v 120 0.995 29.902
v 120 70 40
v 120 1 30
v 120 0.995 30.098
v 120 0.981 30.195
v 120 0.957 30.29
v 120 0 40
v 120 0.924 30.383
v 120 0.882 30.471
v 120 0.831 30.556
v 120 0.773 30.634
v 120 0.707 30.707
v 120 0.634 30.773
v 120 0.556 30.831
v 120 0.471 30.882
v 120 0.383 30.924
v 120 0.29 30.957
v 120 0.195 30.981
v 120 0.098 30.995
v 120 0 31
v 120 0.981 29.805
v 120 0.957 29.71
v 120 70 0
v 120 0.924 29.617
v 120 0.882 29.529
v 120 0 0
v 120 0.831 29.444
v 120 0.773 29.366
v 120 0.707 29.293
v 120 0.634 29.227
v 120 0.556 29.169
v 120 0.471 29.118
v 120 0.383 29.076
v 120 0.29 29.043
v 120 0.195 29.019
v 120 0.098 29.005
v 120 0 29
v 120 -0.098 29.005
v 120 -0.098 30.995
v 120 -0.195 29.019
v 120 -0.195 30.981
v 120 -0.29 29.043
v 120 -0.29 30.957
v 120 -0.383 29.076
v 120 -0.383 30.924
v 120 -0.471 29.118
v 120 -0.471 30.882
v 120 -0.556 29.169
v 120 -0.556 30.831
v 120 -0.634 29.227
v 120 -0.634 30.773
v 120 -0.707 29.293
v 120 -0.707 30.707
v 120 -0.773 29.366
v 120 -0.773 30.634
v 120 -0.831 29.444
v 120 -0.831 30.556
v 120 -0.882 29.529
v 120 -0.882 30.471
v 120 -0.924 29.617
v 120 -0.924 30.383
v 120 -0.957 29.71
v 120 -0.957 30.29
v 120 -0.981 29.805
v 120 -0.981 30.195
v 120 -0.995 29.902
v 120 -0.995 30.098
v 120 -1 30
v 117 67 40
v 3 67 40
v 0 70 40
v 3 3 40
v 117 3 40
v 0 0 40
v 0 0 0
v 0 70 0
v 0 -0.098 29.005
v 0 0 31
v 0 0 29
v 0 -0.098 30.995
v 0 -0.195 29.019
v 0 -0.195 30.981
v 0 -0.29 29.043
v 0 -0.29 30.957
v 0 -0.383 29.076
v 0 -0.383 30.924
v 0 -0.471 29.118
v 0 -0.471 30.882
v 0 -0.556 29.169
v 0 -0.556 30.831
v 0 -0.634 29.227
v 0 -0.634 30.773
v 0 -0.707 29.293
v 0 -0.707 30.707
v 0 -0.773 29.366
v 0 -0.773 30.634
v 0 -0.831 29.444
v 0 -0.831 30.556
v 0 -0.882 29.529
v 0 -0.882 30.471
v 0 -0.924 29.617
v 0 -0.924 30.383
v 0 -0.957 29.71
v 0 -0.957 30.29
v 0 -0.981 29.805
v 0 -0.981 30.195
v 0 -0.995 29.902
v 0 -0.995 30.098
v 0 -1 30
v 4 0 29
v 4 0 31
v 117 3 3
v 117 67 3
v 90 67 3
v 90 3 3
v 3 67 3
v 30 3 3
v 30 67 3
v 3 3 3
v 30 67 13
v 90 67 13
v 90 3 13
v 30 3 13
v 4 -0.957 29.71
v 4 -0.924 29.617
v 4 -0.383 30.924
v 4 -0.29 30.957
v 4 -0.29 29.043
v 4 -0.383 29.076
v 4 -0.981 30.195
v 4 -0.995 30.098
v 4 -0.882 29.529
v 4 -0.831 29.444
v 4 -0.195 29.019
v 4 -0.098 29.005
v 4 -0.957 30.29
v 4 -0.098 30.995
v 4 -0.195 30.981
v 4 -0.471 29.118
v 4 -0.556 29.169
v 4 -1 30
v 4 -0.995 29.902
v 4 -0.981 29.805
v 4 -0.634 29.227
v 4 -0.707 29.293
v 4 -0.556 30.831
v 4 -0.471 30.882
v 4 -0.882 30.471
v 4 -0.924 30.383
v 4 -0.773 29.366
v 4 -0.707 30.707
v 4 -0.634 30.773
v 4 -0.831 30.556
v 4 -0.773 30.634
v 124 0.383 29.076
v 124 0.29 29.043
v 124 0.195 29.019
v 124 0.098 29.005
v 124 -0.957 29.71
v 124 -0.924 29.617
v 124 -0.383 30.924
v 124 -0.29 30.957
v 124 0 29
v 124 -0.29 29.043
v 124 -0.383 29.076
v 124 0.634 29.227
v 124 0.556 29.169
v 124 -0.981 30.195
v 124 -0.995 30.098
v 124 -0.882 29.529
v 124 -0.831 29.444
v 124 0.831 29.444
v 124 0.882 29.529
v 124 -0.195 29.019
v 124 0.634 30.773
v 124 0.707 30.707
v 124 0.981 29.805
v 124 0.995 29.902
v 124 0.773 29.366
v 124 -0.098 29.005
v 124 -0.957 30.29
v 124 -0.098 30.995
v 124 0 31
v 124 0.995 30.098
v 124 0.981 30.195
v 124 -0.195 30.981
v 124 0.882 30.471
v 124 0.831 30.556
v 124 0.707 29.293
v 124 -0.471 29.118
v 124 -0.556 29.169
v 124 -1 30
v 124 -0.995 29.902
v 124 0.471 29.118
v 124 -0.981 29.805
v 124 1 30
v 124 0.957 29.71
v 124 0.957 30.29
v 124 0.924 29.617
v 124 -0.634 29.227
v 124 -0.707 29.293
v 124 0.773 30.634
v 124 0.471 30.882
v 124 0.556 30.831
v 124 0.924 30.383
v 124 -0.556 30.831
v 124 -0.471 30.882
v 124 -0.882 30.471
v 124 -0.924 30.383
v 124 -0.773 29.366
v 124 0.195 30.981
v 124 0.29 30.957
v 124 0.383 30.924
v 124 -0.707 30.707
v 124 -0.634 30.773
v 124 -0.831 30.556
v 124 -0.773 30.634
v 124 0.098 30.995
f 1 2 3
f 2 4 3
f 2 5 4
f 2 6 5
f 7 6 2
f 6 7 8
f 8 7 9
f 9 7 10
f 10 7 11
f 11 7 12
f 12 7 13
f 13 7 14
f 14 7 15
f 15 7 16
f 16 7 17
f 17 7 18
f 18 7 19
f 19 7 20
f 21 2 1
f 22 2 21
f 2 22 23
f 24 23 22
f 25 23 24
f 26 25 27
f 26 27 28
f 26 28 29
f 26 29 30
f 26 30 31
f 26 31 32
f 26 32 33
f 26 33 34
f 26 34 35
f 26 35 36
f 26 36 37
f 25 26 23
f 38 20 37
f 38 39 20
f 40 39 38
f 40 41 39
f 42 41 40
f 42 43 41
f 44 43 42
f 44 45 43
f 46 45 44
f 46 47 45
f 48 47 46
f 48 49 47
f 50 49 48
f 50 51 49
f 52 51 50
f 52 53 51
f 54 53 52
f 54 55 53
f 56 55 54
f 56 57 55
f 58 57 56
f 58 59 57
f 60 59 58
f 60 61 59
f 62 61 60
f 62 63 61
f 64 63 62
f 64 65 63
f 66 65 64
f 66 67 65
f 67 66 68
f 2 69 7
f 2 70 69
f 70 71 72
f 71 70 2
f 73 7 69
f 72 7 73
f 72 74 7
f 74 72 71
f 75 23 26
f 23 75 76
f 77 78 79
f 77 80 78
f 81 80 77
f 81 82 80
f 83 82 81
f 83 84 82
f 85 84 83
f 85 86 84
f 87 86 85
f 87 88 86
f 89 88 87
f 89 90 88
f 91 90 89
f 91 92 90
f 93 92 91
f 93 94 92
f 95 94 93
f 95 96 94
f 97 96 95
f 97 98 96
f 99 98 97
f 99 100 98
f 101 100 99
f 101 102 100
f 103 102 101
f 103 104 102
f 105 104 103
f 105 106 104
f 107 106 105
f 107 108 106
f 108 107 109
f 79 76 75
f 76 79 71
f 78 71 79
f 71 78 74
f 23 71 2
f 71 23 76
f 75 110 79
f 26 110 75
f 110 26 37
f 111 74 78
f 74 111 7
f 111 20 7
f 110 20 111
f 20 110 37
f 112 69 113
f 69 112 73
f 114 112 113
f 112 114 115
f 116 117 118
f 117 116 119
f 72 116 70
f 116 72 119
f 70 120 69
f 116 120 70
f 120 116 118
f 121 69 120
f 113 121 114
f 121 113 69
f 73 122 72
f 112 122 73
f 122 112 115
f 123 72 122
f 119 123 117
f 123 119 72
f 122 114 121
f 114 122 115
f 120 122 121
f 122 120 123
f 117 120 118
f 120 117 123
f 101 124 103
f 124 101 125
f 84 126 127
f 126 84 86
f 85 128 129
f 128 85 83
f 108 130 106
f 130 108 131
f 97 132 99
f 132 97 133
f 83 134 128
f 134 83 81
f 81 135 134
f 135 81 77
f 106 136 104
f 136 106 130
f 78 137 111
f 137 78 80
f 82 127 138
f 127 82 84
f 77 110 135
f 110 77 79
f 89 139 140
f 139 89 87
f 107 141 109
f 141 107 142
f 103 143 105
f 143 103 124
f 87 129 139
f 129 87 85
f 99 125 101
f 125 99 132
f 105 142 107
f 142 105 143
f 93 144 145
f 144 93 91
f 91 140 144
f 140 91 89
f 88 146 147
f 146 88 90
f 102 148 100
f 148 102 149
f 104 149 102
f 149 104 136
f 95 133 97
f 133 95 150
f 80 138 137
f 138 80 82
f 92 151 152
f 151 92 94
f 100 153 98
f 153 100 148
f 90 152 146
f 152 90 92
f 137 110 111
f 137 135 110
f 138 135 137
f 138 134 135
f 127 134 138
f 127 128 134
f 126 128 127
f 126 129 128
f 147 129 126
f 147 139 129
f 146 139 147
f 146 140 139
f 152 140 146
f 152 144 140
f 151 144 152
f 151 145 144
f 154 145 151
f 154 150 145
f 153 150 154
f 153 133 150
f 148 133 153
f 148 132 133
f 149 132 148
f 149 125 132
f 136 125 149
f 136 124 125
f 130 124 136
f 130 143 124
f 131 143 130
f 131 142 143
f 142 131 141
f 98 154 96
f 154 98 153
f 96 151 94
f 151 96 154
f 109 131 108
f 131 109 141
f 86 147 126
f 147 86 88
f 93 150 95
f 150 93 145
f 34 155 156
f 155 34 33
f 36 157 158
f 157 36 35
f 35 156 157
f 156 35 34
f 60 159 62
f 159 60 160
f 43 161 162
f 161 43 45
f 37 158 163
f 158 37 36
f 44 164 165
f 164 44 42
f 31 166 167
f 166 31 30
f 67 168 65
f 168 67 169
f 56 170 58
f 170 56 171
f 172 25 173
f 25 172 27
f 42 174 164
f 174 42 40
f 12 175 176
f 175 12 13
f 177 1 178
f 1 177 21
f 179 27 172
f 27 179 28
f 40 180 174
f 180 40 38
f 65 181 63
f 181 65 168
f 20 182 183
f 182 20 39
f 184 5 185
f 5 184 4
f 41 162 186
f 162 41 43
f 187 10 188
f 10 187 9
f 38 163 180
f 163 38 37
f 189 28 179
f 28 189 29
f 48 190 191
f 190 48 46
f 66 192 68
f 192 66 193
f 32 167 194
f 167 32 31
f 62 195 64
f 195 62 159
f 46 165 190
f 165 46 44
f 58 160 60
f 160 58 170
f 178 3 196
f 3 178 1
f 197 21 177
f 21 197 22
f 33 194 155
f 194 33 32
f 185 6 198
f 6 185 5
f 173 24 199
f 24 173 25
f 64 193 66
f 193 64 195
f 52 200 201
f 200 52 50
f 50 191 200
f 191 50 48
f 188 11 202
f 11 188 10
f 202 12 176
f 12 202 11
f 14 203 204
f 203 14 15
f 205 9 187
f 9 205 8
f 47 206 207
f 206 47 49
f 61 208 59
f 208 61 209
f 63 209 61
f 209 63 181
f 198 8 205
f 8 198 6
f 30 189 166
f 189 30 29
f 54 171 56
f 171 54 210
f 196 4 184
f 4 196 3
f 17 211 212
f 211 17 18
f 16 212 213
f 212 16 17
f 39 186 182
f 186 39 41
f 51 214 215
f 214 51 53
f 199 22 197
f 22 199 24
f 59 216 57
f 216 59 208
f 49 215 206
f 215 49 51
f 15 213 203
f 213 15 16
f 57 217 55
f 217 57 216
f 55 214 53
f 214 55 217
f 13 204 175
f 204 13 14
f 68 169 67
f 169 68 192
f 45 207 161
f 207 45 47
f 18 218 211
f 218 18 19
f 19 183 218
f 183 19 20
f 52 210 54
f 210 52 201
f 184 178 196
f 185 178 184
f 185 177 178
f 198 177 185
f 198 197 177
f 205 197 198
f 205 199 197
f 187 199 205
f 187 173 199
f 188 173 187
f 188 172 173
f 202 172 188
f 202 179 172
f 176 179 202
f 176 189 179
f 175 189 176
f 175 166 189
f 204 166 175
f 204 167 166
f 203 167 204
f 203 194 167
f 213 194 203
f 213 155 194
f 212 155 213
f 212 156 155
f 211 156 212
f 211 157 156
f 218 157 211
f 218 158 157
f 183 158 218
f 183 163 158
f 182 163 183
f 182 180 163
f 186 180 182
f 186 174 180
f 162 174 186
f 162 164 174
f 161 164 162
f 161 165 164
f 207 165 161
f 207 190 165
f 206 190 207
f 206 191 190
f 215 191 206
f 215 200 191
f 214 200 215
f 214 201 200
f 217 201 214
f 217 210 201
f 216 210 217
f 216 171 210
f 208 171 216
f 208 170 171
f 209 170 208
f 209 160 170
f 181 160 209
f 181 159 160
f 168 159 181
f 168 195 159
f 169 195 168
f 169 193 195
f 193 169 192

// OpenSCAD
// Buffer Tank for Mini Horizontal Gel Electrophoresis
// Units: millimetres

// Outer Dimensions
$outer_x = 120;
$outer_y = 70;
$outer_z = 40;

// Wall and Floor Thickness
$wall_thickness = 3;
$floor_thickness = 3;

// Platform Dimensions
$platform_length = 60; // X dimension
$platform_width = $outer_y - (2 * $wall_thickness); // Spans full inner width
$platform_height = 10; // Height above inner floor
$platform_top_z = $floor_thickness + $platform_height; // Absolute Z of top surface (should be 13)

// Hole Dimensions
$hole_diameter = 2;
$hole_y = 0; // Specified position
$hole_z = 30; // Absolute Z position
$hole_extension = 0.5; // Extension past the face for clean cutting

// Resolution for curved shapes
$fn = 64;

// Main Tank Body
// Constructed as a hollow box with a floor
difference() {
    // Outer Box
    cube([
        $outer_x, 
        $outer_y, 
        $outer_z
    ]);
    
    // Inner Void (Hollow space)
    // The void starts at z = $floor_thickness
    translate([
        $wall_thickness, 
        $wall_thickness, 
        $floor_thickness
    ]) {
        cube([
            $outer_x - (2 * $wall_thickness), 
            $outer_y - (2 * $wall_thickness), 
            $outer_z - $floor_thickness
        ]);
    }
}

// Raised Platform
// Positioned in the middle of the tank, spanning full inner width
// Base is at z = $floor_thickness (3), height is 10, so top is at 13.
translate([
    ($outer_x / 2) - ($platform_length / 2), 
    $wall_thickness, // Aligned with inner wall start
    $floor_thickness
]) {
    cube([
        $platform_length, 
        $platform_width, 
        $platform_height
    ]);
}

// Electrode Holes
// Two holes, one at each end (X = 0 and X = $outer_x), 
// along the Y axis at the specified Y and Z.
// Orientation: Horizontal along X axis.
// We use difference to cut these out of the existing solid.

// Helper to create a horizontal hole
module horizontal_hole(x_pos, y_pos, z_pos, length) {
    translate([x_pos, y_pos, z_pos]) {
        // Cylinder aligned with X axis (rotate 90 deg around Y)
        rotate([0, 90, 0]) {
            cylinder(
                h = length,
                r = $hole_diameter / 2,
                $fn = $fn
            );
        }
    }
}

// Left End Hole
// Position: x=0, y=0, z=30
// Length: Must cut through the wall at x=0 (thickness 3) plus extension.
// To keep bounding box at 120, we cut from x=-extension to x=wall_thickness+extension.
// Length = $wall_thickness + 2 * $hole_extension
length_left = $wall_thickness + (2 * $hole_extension);
horizontal_hole(0, $hole_y, $hole_z, length_left);

// Right End Hole
// Position: x=120, y=0, z=30
// Length: Same as left
length_right = $wall_thickness + (2 * $hole_extension);
horizontal_hole($outer_x, $hole_y, $hole_z, length_right);
